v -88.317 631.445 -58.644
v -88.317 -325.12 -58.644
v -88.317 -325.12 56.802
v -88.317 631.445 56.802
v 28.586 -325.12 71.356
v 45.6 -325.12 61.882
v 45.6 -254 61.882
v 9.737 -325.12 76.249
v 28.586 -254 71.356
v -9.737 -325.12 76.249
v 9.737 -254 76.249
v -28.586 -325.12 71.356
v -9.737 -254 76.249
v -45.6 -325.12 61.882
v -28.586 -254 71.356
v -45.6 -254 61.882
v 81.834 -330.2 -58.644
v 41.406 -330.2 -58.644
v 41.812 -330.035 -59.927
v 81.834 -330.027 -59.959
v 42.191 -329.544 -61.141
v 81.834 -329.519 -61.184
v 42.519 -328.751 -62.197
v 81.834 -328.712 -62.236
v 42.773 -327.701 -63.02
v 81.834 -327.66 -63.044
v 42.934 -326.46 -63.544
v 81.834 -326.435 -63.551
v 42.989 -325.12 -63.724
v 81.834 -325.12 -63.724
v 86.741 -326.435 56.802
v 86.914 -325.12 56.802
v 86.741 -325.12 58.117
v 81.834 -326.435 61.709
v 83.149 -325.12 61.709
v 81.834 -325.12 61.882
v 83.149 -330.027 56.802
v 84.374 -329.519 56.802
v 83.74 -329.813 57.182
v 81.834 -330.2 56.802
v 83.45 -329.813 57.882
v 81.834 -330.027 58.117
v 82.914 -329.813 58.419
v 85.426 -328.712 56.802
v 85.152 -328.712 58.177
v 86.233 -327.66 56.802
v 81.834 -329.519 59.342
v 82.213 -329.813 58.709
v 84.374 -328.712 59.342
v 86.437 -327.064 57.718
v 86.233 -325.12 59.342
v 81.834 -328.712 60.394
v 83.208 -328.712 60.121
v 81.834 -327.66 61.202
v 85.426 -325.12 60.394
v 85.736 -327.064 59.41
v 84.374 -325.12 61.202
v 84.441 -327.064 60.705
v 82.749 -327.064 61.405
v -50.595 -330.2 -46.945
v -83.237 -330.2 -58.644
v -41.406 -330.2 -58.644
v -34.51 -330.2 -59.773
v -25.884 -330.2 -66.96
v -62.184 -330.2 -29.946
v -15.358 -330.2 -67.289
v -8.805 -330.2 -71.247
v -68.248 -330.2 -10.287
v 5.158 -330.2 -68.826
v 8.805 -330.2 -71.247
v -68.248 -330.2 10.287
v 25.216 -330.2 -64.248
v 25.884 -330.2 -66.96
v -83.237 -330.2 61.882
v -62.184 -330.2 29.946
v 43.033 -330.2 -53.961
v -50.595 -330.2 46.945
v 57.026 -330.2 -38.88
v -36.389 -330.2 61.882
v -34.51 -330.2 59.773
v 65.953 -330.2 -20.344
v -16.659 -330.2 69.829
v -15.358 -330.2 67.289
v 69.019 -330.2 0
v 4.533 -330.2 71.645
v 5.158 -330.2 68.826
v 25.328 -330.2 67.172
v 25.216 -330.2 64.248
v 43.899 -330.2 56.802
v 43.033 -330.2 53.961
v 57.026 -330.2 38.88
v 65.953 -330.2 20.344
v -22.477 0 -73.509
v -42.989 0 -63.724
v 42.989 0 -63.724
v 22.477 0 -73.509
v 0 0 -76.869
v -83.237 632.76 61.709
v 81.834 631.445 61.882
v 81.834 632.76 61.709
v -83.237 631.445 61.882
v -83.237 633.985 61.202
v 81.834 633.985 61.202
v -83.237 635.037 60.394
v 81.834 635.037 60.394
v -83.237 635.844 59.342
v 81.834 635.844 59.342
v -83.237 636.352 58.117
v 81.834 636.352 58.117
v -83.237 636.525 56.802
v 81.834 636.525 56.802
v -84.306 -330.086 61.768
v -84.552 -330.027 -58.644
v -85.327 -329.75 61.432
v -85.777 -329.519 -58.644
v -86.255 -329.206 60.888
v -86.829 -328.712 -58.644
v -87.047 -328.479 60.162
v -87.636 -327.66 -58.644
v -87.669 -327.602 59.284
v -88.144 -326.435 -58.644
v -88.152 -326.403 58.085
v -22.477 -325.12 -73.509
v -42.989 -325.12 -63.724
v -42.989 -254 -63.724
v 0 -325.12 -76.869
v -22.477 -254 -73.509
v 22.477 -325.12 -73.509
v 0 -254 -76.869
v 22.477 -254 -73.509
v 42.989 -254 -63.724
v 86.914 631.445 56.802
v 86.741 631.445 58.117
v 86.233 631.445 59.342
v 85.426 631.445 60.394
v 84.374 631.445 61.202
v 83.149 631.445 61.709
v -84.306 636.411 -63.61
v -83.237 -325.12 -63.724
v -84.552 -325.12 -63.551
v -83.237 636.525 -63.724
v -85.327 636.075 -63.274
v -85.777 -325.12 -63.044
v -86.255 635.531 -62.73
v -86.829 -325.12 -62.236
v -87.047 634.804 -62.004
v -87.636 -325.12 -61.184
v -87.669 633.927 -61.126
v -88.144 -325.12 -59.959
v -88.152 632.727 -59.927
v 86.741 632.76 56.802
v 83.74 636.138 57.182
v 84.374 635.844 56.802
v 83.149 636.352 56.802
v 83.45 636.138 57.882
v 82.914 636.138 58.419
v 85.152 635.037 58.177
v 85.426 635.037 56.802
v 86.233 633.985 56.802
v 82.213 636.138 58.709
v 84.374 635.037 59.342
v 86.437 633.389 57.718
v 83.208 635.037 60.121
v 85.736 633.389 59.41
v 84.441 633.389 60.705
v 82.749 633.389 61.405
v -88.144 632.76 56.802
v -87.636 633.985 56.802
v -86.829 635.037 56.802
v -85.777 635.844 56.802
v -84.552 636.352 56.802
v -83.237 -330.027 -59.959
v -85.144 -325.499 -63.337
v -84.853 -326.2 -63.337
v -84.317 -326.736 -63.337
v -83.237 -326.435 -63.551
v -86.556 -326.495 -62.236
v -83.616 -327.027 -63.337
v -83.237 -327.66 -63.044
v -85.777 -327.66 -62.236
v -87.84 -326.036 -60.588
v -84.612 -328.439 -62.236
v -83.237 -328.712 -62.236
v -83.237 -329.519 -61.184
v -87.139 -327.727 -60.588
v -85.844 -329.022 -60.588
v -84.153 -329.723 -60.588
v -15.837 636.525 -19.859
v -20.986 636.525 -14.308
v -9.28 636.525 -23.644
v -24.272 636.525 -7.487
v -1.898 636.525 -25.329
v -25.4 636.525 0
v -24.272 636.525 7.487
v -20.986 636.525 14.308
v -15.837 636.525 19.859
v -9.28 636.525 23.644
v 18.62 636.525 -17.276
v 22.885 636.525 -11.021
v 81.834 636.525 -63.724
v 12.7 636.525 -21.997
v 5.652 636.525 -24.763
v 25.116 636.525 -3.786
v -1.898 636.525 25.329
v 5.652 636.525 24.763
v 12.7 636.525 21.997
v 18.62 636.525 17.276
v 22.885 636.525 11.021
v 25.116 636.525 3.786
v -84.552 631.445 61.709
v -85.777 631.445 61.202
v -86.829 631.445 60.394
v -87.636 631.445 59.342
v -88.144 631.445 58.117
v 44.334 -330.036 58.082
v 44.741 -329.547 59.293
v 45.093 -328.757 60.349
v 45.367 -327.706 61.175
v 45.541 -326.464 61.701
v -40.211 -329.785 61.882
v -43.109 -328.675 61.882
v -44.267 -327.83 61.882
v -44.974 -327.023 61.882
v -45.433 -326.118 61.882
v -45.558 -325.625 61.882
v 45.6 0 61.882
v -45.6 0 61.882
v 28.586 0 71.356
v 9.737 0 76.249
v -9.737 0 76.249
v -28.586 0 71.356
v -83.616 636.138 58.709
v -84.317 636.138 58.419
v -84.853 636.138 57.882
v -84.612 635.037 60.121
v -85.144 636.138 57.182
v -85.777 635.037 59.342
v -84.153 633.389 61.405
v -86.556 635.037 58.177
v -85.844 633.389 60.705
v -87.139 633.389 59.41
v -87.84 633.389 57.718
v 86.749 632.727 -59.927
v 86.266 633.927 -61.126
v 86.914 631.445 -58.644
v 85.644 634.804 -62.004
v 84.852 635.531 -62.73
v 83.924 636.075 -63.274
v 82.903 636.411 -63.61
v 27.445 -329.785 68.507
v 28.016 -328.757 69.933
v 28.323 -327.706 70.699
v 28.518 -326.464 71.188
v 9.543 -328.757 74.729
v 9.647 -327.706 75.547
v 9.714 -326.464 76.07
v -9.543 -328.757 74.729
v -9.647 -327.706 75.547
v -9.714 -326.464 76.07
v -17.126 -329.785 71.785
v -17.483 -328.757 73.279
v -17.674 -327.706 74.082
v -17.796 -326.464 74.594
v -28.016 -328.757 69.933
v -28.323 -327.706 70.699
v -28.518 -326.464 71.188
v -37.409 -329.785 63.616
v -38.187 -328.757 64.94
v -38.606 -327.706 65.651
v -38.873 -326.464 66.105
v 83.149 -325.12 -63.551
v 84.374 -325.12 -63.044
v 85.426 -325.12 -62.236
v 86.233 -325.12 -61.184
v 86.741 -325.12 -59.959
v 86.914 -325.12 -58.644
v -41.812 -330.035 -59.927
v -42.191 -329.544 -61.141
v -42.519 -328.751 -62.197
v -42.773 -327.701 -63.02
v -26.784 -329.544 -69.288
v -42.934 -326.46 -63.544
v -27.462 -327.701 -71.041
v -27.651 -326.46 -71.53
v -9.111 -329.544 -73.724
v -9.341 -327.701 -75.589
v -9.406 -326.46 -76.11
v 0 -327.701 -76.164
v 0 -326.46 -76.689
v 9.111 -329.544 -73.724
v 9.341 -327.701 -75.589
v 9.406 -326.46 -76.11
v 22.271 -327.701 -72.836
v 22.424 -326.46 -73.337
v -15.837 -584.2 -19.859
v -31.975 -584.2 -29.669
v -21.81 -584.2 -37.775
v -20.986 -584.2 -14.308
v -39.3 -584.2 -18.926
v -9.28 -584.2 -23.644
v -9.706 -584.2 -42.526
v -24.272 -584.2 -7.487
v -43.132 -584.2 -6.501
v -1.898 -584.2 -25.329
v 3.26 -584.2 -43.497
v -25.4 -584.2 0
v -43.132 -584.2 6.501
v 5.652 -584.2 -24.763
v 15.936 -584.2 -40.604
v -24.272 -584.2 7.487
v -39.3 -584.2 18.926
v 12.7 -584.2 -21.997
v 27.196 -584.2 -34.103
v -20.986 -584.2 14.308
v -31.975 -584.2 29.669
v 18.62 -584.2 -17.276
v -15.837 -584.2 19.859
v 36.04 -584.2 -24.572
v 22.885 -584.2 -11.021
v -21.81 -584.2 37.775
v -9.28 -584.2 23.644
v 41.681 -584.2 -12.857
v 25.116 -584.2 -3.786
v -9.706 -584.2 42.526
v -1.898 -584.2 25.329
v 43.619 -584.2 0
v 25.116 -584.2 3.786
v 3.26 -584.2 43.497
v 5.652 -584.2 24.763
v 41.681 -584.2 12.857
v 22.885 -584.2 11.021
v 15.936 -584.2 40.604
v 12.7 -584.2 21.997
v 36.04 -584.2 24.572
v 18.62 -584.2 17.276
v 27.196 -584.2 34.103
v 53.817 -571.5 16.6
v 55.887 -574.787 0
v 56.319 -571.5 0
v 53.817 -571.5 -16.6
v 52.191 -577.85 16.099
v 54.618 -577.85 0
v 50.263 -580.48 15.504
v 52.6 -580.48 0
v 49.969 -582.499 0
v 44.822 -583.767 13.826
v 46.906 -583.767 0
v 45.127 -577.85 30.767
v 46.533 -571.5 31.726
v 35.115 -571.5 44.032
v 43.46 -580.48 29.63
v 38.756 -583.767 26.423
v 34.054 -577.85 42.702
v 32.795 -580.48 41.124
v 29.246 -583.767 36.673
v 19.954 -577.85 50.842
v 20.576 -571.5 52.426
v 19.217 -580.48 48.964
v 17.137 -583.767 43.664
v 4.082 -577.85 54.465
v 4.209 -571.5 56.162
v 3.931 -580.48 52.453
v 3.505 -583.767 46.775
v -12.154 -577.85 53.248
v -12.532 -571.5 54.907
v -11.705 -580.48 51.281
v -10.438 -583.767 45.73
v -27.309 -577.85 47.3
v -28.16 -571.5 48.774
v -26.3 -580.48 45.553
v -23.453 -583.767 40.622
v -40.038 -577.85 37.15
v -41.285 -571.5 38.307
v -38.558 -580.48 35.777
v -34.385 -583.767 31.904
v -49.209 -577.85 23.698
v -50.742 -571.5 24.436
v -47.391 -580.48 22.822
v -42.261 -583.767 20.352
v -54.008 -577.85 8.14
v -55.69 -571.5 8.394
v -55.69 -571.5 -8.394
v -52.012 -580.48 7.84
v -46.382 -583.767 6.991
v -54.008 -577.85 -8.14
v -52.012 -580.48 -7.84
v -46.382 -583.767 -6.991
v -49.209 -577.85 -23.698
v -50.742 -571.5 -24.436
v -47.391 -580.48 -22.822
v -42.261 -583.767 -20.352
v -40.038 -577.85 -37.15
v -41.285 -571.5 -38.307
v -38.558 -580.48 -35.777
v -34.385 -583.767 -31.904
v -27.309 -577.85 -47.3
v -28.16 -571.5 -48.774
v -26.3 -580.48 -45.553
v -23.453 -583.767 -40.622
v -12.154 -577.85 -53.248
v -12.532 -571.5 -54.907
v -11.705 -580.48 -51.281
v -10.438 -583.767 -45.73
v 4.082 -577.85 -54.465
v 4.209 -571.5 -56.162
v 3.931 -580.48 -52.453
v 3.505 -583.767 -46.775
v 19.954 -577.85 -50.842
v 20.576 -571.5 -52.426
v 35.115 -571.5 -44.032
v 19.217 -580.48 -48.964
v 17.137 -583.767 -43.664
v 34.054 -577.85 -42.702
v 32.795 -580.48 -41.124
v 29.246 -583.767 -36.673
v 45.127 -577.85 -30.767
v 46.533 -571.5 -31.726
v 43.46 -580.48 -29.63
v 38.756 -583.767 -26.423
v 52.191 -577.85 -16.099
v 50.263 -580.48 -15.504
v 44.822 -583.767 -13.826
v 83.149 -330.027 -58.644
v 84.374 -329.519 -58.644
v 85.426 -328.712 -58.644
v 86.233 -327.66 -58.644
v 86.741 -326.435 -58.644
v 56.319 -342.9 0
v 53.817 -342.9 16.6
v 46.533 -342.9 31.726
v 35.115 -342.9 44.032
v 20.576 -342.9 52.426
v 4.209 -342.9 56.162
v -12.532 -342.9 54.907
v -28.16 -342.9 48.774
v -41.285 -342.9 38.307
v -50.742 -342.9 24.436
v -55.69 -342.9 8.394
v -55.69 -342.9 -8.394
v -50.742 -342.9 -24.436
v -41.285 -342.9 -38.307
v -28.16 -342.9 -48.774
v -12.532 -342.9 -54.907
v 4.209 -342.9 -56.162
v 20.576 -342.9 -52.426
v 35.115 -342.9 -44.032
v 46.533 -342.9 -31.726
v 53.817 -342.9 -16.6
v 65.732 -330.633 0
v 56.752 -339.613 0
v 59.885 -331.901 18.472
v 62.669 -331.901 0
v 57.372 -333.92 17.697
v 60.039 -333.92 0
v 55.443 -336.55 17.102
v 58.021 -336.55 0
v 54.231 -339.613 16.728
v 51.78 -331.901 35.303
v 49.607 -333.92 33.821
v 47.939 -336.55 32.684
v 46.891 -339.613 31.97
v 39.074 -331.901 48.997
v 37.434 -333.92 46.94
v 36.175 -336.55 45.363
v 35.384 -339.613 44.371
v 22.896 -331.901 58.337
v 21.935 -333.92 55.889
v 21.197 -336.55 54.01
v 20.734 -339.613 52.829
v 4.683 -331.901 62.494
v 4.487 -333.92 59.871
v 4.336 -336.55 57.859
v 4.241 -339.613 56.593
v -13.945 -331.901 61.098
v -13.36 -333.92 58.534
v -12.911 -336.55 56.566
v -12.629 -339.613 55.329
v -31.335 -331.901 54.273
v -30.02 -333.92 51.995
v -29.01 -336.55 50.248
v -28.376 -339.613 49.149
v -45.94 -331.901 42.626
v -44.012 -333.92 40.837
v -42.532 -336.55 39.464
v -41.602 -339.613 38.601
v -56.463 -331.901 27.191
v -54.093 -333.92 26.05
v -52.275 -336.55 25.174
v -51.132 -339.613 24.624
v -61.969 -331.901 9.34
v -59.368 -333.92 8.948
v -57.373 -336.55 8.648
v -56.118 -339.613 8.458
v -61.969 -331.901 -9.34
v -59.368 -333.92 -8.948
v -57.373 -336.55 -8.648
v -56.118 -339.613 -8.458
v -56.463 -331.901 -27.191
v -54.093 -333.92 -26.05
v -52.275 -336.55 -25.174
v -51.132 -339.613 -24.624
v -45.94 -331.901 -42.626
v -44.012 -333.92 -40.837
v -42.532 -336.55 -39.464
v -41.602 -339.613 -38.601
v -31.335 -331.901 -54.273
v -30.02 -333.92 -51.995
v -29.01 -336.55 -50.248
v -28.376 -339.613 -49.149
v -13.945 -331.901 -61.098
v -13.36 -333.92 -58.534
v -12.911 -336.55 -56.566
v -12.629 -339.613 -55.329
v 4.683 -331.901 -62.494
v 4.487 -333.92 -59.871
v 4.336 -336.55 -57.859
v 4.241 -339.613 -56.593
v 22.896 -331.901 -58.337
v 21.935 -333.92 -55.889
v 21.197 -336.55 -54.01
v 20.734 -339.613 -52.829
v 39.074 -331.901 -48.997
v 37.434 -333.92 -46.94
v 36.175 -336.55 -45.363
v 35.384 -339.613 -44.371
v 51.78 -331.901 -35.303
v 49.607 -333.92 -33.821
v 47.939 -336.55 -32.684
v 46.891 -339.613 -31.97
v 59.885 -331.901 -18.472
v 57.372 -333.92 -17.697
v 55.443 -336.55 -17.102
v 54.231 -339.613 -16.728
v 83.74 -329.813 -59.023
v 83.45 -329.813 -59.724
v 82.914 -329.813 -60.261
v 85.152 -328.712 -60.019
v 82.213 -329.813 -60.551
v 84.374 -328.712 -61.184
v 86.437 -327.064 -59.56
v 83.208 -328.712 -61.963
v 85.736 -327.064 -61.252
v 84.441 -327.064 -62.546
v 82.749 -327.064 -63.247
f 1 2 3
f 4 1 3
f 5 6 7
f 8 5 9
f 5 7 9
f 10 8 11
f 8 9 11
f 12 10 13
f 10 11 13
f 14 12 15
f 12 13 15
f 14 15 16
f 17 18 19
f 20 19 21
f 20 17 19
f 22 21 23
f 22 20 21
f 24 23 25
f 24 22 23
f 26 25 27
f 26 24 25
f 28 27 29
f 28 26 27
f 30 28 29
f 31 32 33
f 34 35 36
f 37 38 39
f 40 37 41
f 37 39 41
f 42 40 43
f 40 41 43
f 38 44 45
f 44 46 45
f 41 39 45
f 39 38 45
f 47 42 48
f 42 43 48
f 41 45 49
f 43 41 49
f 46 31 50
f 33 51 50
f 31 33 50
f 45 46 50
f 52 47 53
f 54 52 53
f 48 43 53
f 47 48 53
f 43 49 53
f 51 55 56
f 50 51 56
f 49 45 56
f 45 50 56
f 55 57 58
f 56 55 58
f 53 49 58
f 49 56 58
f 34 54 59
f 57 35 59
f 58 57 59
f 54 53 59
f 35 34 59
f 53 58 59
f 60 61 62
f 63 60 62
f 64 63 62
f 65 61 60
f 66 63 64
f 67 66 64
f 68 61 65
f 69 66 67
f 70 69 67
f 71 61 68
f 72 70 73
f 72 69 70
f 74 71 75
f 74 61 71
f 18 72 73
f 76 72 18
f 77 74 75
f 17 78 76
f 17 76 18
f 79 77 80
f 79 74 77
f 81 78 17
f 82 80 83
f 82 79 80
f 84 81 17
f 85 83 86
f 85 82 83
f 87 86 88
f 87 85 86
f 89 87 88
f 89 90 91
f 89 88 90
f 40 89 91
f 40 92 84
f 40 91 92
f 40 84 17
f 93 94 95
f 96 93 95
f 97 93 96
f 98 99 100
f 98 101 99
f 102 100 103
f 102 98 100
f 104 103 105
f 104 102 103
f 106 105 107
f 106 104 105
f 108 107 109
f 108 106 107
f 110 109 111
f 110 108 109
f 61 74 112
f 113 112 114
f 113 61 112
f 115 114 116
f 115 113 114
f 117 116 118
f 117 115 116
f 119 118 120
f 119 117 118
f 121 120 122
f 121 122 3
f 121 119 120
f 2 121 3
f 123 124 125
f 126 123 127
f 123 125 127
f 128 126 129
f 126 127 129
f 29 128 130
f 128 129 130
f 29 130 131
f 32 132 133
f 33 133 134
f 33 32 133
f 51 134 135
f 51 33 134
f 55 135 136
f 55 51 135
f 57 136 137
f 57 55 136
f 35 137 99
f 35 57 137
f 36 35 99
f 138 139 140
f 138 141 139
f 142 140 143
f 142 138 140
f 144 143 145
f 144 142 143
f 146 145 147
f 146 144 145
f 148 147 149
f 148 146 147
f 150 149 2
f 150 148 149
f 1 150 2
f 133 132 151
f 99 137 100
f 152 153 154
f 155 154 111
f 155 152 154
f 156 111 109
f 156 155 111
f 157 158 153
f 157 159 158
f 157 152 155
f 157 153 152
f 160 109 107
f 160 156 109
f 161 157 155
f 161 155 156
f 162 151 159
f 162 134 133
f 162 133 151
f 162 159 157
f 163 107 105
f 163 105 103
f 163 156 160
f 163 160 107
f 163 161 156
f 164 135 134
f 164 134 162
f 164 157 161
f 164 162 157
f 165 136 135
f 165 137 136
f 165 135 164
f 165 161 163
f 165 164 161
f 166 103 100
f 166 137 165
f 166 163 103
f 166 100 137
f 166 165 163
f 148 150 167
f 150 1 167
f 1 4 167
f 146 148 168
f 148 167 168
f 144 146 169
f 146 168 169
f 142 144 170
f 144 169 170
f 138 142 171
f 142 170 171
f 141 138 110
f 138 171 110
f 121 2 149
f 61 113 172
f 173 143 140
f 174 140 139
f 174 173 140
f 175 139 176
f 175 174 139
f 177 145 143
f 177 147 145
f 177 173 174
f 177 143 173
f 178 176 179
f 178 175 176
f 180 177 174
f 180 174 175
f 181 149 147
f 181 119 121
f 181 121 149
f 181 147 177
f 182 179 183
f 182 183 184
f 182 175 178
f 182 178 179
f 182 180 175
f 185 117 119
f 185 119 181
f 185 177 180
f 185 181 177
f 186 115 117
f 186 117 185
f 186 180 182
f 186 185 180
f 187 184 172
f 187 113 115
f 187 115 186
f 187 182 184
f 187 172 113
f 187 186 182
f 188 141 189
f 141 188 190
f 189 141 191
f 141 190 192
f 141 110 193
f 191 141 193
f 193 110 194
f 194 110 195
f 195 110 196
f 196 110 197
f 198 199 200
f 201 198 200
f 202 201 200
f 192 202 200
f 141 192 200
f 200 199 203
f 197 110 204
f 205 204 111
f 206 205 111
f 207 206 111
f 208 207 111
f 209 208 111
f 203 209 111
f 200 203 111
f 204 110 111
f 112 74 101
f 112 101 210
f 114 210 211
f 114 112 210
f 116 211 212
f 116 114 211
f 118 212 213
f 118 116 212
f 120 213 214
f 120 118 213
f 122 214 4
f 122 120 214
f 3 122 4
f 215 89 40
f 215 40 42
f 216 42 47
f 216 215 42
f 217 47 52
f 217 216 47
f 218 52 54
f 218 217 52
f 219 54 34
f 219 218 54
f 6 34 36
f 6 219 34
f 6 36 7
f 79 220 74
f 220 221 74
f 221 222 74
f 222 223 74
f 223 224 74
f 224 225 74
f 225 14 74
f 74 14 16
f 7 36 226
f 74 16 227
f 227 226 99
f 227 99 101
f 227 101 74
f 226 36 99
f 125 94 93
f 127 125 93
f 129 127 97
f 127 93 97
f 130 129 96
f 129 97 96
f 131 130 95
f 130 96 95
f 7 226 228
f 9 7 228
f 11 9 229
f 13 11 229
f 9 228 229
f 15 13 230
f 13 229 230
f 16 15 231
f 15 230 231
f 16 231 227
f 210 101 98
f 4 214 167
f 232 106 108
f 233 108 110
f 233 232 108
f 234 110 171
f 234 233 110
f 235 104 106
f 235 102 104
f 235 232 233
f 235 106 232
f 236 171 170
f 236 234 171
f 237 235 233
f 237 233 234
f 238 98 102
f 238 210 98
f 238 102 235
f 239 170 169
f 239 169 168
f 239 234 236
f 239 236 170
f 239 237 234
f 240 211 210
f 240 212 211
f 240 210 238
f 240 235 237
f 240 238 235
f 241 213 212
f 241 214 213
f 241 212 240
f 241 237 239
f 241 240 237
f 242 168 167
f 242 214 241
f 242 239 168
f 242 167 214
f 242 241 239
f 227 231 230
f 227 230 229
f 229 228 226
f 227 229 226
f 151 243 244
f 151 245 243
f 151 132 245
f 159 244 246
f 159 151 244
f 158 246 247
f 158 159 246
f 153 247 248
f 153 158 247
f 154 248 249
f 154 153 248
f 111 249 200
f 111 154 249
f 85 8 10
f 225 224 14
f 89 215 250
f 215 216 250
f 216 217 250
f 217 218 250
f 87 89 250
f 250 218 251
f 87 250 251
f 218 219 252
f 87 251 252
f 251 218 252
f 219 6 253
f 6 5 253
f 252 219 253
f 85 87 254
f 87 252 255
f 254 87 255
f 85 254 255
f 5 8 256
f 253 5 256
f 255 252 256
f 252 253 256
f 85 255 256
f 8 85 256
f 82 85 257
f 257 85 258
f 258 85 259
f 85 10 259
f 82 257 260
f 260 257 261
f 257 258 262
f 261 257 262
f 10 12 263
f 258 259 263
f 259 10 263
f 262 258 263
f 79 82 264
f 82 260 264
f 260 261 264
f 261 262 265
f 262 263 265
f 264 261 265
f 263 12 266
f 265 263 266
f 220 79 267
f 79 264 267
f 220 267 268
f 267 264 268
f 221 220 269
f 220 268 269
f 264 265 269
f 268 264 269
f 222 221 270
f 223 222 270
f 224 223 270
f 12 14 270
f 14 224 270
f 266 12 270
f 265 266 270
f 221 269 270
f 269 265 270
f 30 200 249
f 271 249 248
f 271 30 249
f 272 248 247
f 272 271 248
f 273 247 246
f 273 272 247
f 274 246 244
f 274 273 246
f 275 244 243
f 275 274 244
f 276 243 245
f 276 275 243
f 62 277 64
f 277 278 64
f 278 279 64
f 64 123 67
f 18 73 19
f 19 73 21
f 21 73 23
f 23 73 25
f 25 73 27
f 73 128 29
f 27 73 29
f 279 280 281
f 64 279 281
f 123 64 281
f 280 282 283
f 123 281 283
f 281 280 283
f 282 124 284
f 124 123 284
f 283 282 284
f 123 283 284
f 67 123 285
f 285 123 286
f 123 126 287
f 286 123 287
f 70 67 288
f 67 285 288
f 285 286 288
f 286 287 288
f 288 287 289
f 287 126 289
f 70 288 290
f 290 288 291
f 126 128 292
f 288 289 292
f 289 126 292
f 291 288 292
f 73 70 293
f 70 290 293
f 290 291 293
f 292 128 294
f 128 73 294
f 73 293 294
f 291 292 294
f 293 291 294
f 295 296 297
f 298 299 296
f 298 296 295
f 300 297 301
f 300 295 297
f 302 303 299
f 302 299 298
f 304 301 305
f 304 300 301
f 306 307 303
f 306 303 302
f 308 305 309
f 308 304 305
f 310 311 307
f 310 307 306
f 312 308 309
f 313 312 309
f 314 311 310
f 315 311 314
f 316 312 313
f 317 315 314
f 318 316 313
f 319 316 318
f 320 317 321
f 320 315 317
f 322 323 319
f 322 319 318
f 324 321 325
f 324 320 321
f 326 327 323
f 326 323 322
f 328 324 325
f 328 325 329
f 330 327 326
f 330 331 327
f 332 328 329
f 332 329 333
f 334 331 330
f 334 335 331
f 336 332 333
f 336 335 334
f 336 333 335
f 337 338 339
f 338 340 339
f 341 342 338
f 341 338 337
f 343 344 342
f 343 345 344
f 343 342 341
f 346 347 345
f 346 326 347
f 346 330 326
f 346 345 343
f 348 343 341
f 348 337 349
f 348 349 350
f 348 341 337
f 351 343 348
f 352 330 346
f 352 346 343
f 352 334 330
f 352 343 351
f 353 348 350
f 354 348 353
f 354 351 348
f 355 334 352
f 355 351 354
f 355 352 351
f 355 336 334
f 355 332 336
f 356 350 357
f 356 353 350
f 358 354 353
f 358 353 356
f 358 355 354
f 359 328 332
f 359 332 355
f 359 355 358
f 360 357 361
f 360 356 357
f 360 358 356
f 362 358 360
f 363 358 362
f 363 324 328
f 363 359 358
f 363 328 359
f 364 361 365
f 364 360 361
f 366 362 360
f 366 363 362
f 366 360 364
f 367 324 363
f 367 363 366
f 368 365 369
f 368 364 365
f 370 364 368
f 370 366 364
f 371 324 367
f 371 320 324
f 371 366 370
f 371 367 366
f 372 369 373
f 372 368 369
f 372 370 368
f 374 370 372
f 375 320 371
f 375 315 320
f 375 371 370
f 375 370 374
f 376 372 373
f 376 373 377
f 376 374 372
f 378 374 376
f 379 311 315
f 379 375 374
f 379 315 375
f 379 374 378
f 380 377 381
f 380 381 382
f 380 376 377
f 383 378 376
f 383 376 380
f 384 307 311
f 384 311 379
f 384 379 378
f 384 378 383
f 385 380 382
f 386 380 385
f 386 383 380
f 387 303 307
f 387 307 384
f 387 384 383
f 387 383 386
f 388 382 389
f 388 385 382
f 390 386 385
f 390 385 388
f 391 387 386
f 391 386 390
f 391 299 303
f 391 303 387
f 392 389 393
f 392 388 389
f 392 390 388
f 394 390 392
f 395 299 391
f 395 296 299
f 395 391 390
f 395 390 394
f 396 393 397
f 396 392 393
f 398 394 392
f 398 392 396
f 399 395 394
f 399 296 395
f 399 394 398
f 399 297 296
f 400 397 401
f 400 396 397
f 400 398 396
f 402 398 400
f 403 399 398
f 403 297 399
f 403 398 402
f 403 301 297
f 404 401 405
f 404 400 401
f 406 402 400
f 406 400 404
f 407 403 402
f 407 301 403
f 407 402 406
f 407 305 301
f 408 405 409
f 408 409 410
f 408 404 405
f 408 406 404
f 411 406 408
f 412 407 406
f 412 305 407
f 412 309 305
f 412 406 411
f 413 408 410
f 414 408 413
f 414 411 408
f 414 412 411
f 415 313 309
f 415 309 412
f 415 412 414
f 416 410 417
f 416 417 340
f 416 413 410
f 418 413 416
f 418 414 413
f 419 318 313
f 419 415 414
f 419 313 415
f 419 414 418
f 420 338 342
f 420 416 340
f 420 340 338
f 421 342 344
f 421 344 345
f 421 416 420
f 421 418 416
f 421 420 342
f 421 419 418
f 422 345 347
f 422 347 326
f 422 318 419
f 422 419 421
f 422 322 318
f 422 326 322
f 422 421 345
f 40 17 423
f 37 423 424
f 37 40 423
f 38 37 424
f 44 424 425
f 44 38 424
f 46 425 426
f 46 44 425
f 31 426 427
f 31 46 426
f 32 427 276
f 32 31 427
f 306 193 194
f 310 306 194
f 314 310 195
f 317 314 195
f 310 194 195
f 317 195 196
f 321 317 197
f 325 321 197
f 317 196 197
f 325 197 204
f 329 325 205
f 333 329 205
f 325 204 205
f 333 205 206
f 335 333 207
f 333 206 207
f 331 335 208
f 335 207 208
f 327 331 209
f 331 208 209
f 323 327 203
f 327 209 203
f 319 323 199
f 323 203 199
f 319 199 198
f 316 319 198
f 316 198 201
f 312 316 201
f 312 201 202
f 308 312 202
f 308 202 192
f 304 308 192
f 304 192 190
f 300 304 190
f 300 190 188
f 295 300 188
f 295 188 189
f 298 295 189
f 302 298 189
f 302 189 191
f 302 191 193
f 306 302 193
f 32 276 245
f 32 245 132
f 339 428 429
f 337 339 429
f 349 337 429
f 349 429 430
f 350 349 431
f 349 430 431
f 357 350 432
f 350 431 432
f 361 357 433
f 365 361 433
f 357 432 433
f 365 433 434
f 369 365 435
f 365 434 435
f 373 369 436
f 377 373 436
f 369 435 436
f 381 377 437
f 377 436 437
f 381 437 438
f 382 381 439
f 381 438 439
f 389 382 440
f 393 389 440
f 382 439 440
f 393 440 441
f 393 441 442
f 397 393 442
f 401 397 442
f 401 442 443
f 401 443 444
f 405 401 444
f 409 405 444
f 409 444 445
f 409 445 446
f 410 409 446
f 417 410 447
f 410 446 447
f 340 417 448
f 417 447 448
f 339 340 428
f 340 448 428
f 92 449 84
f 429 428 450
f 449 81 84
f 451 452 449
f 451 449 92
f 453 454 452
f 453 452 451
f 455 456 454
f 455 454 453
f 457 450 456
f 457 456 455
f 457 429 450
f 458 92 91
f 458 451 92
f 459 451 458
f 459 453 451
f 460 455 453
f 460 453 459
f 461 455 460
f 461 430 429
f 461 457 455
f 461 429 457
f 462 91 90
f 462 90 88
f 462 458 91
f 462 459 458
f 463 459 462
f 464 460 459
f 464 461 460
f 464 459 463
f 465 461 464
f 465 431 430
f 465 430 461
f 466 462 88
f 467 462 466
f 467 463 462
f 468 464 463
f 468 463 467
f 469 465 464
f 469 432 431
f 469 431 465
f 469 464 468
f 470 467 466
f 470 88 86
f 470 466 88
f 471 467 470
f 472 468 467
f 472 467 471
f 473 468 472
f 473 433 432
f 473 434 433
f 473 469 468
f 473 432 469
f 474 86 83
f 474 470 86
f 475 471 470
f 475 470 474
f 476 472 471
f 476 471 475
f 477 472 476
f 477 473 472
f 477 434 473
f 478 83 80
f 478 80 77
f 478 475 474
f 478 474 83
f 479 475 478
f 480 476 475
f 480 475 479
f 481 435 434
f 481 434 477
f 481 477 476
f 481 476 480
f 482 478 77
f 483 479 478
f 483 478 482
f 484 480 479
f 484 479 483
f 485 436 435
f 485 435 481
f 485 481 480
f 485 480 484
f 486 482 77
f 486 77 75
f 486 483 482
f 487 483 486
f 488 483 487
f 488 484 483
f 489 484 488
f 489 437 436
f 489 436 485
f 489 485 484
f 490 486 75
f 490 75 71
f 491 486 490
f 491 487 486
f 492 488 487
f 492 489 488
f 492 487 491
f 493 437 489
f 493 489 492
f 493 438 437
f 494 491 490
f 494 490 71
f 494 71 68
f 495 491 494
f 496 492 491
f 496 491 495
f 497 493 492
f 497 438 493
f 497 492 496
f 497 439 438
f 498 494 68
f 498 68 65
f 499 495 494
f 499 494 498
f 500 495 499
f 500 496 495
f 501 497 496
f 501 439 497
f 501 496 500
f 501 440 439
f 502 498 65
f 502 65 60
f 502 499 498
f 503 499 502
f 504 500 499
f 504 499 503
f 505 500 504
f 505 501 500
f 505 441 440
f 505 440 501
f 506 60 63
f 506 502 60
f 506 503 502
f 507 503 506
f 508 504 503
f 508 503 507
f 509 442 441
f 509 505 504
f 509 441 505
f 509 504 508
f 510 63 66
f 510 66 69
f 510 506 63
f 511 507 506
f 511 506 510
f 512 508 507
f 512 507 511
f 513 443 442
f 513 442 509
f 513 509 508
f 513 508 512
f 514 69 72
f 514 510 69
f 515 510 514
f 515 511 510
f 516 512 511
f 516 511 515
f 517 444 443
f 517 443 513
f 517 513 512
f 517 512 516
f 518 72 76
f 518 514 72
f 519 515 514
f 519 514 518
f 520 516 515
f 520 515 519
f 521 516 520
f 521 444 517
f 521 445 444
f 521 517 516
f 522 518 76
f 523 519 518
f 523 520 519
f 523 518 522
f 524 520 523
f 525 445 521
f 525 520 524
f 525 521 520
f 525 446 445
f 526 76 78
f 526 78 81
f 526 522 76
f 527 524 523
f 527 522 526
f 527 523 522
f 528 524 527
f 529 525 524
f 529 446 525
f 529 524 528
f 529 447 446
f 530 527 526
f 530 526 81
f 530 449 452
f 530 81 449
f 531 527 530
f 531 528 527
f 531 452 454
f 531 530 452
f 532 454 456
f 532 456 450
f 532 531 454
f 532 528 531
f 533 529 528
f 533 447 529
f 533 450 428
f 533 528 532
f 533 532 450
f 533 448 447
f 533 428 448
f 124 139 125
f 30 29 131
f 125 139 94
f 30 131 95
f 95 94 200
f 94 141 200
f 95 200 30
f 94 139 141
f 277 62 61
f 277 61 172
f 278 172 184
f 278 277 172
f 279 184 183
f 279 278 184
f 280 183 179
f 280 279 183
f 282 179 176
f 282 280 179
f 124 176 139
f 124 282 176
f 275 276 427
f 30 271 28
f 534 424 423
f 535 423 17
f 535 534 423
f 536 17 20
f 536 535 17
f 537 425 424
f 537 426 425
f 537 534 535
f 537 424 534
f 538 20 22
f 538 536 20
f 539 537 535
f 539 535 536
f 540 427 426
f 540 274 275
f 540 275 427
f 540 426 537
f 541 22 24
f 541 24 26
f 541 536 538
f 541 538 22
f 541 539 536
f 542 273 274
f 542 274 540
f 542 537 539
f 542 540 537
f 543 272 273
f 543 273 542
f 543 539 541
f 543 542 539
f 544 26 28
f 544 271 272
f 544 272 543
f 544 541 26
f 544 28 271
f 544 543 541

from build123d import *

# Parameters (mm, degrees)
F0_R          = 76.8686111214
F1_DEPTH      = 254
F2_W          = 175.2306818962
F2_H          = 125.6063729525
F3_DEPTH      = 890.52474
F4_R          = 58.9166672022
F3_FACE1_W    = 175.2306818962
F3_FACE1_H    = 125.6063729525
F5_DEPTH      = 76.2
F6_R          = 56.3193405809
F7_DEPTH      = 254
F7_DEPTH_BACK = 25.4
F8_R          = 12.7
F9_R          = 12.7
F11_D         = 50.8
F12_R         = 5.08


with BuildPart() as f1:
    # F0 (on Front) → F1 (new body)
    with BuildSketch(Plane.XZ):
        Circle(F0_R)
    extrude(amount=F1_DEPTH)

    # F2 (on face) → F3 (join)
    with BuildSketch(Plane.XZ.offset(254)):
        with Locations((-0.7015764713, -0.9209215641)):
            Rectangle(F2_W, F2_H)
        with BuildLine():
            Line((86.9137644768, 61.8822649121), (45.6000950117, 61.8822649121))
            ThreePointArc((45.6000950117, 61.8822649121), (68.6075773741, 34.6667521206), (76.8686111214, 0))
            ThreePointArc((76.8686111214, 0), (67.8721550854, -36.0853701628), (42.9886197754, -63.7241080403))
            Line((42.9886197754, -63.7241080403), (86.9137644768, -63.7241080403))
            Line((86.9137644768, -63.7241080403), (86.9137644768, 61.8822649121))
        make_face()
    extrude(amount=-F3_DEPTH)

    # F4 (on face) + F3_face (on face) + F3_face1 (on face) → F5 (join)
    with BuildSketch(Plane.XZ.offset(254)):
        Circle(F4_R)
    with BuildSketch(Plane(origin=(-0.6513319222, -254, -0.4226097365), x_dir=(1, 0, 0), z_dir=(0, -1, 0))):
        with BuildLine():
            Line((43.6399516976, -63.3014983039), (87.565096399, -63.3014983039))
            Line((87.565096399, -63.3014983039), (87.565096399, 62.3048746486))
            Line((87.565096399, 62.3048746486), (46.2514269339, 62.3048746486))
            ThreePointArc((46.2514269339, 62.3048746486), (0.6513319222, 77.2912208578), (-44.9487630895, 62.3048746486))
            Line((-44.9487630895, 62.3048746486), (-87.6655854972, 62.3048746486))
            Line((-87.6655854972, 62.3048746486), (-87.6655854972, -63.3014983039))
            Line((-87.6655854972, -63.3014983039), (-42.3372878532, -63.3014983039))
            ThreePointArc((-42.3372878532, -63.3014983039), (0.6513319222, -76.4460013849), (43.6399516976, -63.3014983039))
        make_face()
    with BuildSketch(Plane(origin=(-0.7015764713, 636.52474, -0.9209215641), x_dir=(1, 0, 0), z_dir=(0, 1, 0))):
        Rectangle(F3_FACE1_W, F3_FACE1_H)
    extrude(amount=F5_DEPTH, dir=(0, -1, 0))

    # F6 (on face) → F7 (join, two sides)
    with BuildSketch(Plane.XZ.offset(330.2)) as f7_sk:
        Circle(F6_R)
    extrude(amount=F7_DEPTH)
    extrude(f7_sk.sketch, amount=-F7_DEPTH_BACK)

    # F8
    f8_edges = [f1.edges().sort_by_distance(p)[0] for p in [
        (-56.319341, -330.2, 0),
    ]]
    fillet(f8_edges, radius=F8_R)

    # F9
    f9_edges = [f1.edges().sort_by_distance(p)[0] for p in [
        (-56.319341, -584.2, 0),
    ]]
    fillet(f9_edges, radius=F9_R)

    # F11 (through all)
    with Locations(Plane.XZ.offset(584.2)):
        with Locations((0, 0)):
            Hole(F11_D / 2)

    # F12
    f12_edges = [f1.edges().sort_by_distance(p)[0] for p in [
        (86.913764, 153.16237, 61.882265),
        (-88.316917, 153.16237, 61.882265),
        (86.913764, 153.16237, -63.724108),
        (86.913764, -330.2, -0.920922),
        (-88.316917, -330.2, -0.920922),
        (86.913764, 636.52474, -0.920922),
        (-0.701576, 636.52474, 61.882265),
        (-88.316917, 153.16237, -63.724108),
        (-65.652769, -330.2, -63.724108),
        (64.951192, -330.2, -63.724108),
        (0, -330.2, 76.868611),
        (0, -330.2, -76.868611),
        (66.25693, -330.2, 61.882265),
        (-88.316917, 636.52474, -0.920922),
    ]]
    fillet(f12_edges, radius=F12_R)


solid = f1.part
